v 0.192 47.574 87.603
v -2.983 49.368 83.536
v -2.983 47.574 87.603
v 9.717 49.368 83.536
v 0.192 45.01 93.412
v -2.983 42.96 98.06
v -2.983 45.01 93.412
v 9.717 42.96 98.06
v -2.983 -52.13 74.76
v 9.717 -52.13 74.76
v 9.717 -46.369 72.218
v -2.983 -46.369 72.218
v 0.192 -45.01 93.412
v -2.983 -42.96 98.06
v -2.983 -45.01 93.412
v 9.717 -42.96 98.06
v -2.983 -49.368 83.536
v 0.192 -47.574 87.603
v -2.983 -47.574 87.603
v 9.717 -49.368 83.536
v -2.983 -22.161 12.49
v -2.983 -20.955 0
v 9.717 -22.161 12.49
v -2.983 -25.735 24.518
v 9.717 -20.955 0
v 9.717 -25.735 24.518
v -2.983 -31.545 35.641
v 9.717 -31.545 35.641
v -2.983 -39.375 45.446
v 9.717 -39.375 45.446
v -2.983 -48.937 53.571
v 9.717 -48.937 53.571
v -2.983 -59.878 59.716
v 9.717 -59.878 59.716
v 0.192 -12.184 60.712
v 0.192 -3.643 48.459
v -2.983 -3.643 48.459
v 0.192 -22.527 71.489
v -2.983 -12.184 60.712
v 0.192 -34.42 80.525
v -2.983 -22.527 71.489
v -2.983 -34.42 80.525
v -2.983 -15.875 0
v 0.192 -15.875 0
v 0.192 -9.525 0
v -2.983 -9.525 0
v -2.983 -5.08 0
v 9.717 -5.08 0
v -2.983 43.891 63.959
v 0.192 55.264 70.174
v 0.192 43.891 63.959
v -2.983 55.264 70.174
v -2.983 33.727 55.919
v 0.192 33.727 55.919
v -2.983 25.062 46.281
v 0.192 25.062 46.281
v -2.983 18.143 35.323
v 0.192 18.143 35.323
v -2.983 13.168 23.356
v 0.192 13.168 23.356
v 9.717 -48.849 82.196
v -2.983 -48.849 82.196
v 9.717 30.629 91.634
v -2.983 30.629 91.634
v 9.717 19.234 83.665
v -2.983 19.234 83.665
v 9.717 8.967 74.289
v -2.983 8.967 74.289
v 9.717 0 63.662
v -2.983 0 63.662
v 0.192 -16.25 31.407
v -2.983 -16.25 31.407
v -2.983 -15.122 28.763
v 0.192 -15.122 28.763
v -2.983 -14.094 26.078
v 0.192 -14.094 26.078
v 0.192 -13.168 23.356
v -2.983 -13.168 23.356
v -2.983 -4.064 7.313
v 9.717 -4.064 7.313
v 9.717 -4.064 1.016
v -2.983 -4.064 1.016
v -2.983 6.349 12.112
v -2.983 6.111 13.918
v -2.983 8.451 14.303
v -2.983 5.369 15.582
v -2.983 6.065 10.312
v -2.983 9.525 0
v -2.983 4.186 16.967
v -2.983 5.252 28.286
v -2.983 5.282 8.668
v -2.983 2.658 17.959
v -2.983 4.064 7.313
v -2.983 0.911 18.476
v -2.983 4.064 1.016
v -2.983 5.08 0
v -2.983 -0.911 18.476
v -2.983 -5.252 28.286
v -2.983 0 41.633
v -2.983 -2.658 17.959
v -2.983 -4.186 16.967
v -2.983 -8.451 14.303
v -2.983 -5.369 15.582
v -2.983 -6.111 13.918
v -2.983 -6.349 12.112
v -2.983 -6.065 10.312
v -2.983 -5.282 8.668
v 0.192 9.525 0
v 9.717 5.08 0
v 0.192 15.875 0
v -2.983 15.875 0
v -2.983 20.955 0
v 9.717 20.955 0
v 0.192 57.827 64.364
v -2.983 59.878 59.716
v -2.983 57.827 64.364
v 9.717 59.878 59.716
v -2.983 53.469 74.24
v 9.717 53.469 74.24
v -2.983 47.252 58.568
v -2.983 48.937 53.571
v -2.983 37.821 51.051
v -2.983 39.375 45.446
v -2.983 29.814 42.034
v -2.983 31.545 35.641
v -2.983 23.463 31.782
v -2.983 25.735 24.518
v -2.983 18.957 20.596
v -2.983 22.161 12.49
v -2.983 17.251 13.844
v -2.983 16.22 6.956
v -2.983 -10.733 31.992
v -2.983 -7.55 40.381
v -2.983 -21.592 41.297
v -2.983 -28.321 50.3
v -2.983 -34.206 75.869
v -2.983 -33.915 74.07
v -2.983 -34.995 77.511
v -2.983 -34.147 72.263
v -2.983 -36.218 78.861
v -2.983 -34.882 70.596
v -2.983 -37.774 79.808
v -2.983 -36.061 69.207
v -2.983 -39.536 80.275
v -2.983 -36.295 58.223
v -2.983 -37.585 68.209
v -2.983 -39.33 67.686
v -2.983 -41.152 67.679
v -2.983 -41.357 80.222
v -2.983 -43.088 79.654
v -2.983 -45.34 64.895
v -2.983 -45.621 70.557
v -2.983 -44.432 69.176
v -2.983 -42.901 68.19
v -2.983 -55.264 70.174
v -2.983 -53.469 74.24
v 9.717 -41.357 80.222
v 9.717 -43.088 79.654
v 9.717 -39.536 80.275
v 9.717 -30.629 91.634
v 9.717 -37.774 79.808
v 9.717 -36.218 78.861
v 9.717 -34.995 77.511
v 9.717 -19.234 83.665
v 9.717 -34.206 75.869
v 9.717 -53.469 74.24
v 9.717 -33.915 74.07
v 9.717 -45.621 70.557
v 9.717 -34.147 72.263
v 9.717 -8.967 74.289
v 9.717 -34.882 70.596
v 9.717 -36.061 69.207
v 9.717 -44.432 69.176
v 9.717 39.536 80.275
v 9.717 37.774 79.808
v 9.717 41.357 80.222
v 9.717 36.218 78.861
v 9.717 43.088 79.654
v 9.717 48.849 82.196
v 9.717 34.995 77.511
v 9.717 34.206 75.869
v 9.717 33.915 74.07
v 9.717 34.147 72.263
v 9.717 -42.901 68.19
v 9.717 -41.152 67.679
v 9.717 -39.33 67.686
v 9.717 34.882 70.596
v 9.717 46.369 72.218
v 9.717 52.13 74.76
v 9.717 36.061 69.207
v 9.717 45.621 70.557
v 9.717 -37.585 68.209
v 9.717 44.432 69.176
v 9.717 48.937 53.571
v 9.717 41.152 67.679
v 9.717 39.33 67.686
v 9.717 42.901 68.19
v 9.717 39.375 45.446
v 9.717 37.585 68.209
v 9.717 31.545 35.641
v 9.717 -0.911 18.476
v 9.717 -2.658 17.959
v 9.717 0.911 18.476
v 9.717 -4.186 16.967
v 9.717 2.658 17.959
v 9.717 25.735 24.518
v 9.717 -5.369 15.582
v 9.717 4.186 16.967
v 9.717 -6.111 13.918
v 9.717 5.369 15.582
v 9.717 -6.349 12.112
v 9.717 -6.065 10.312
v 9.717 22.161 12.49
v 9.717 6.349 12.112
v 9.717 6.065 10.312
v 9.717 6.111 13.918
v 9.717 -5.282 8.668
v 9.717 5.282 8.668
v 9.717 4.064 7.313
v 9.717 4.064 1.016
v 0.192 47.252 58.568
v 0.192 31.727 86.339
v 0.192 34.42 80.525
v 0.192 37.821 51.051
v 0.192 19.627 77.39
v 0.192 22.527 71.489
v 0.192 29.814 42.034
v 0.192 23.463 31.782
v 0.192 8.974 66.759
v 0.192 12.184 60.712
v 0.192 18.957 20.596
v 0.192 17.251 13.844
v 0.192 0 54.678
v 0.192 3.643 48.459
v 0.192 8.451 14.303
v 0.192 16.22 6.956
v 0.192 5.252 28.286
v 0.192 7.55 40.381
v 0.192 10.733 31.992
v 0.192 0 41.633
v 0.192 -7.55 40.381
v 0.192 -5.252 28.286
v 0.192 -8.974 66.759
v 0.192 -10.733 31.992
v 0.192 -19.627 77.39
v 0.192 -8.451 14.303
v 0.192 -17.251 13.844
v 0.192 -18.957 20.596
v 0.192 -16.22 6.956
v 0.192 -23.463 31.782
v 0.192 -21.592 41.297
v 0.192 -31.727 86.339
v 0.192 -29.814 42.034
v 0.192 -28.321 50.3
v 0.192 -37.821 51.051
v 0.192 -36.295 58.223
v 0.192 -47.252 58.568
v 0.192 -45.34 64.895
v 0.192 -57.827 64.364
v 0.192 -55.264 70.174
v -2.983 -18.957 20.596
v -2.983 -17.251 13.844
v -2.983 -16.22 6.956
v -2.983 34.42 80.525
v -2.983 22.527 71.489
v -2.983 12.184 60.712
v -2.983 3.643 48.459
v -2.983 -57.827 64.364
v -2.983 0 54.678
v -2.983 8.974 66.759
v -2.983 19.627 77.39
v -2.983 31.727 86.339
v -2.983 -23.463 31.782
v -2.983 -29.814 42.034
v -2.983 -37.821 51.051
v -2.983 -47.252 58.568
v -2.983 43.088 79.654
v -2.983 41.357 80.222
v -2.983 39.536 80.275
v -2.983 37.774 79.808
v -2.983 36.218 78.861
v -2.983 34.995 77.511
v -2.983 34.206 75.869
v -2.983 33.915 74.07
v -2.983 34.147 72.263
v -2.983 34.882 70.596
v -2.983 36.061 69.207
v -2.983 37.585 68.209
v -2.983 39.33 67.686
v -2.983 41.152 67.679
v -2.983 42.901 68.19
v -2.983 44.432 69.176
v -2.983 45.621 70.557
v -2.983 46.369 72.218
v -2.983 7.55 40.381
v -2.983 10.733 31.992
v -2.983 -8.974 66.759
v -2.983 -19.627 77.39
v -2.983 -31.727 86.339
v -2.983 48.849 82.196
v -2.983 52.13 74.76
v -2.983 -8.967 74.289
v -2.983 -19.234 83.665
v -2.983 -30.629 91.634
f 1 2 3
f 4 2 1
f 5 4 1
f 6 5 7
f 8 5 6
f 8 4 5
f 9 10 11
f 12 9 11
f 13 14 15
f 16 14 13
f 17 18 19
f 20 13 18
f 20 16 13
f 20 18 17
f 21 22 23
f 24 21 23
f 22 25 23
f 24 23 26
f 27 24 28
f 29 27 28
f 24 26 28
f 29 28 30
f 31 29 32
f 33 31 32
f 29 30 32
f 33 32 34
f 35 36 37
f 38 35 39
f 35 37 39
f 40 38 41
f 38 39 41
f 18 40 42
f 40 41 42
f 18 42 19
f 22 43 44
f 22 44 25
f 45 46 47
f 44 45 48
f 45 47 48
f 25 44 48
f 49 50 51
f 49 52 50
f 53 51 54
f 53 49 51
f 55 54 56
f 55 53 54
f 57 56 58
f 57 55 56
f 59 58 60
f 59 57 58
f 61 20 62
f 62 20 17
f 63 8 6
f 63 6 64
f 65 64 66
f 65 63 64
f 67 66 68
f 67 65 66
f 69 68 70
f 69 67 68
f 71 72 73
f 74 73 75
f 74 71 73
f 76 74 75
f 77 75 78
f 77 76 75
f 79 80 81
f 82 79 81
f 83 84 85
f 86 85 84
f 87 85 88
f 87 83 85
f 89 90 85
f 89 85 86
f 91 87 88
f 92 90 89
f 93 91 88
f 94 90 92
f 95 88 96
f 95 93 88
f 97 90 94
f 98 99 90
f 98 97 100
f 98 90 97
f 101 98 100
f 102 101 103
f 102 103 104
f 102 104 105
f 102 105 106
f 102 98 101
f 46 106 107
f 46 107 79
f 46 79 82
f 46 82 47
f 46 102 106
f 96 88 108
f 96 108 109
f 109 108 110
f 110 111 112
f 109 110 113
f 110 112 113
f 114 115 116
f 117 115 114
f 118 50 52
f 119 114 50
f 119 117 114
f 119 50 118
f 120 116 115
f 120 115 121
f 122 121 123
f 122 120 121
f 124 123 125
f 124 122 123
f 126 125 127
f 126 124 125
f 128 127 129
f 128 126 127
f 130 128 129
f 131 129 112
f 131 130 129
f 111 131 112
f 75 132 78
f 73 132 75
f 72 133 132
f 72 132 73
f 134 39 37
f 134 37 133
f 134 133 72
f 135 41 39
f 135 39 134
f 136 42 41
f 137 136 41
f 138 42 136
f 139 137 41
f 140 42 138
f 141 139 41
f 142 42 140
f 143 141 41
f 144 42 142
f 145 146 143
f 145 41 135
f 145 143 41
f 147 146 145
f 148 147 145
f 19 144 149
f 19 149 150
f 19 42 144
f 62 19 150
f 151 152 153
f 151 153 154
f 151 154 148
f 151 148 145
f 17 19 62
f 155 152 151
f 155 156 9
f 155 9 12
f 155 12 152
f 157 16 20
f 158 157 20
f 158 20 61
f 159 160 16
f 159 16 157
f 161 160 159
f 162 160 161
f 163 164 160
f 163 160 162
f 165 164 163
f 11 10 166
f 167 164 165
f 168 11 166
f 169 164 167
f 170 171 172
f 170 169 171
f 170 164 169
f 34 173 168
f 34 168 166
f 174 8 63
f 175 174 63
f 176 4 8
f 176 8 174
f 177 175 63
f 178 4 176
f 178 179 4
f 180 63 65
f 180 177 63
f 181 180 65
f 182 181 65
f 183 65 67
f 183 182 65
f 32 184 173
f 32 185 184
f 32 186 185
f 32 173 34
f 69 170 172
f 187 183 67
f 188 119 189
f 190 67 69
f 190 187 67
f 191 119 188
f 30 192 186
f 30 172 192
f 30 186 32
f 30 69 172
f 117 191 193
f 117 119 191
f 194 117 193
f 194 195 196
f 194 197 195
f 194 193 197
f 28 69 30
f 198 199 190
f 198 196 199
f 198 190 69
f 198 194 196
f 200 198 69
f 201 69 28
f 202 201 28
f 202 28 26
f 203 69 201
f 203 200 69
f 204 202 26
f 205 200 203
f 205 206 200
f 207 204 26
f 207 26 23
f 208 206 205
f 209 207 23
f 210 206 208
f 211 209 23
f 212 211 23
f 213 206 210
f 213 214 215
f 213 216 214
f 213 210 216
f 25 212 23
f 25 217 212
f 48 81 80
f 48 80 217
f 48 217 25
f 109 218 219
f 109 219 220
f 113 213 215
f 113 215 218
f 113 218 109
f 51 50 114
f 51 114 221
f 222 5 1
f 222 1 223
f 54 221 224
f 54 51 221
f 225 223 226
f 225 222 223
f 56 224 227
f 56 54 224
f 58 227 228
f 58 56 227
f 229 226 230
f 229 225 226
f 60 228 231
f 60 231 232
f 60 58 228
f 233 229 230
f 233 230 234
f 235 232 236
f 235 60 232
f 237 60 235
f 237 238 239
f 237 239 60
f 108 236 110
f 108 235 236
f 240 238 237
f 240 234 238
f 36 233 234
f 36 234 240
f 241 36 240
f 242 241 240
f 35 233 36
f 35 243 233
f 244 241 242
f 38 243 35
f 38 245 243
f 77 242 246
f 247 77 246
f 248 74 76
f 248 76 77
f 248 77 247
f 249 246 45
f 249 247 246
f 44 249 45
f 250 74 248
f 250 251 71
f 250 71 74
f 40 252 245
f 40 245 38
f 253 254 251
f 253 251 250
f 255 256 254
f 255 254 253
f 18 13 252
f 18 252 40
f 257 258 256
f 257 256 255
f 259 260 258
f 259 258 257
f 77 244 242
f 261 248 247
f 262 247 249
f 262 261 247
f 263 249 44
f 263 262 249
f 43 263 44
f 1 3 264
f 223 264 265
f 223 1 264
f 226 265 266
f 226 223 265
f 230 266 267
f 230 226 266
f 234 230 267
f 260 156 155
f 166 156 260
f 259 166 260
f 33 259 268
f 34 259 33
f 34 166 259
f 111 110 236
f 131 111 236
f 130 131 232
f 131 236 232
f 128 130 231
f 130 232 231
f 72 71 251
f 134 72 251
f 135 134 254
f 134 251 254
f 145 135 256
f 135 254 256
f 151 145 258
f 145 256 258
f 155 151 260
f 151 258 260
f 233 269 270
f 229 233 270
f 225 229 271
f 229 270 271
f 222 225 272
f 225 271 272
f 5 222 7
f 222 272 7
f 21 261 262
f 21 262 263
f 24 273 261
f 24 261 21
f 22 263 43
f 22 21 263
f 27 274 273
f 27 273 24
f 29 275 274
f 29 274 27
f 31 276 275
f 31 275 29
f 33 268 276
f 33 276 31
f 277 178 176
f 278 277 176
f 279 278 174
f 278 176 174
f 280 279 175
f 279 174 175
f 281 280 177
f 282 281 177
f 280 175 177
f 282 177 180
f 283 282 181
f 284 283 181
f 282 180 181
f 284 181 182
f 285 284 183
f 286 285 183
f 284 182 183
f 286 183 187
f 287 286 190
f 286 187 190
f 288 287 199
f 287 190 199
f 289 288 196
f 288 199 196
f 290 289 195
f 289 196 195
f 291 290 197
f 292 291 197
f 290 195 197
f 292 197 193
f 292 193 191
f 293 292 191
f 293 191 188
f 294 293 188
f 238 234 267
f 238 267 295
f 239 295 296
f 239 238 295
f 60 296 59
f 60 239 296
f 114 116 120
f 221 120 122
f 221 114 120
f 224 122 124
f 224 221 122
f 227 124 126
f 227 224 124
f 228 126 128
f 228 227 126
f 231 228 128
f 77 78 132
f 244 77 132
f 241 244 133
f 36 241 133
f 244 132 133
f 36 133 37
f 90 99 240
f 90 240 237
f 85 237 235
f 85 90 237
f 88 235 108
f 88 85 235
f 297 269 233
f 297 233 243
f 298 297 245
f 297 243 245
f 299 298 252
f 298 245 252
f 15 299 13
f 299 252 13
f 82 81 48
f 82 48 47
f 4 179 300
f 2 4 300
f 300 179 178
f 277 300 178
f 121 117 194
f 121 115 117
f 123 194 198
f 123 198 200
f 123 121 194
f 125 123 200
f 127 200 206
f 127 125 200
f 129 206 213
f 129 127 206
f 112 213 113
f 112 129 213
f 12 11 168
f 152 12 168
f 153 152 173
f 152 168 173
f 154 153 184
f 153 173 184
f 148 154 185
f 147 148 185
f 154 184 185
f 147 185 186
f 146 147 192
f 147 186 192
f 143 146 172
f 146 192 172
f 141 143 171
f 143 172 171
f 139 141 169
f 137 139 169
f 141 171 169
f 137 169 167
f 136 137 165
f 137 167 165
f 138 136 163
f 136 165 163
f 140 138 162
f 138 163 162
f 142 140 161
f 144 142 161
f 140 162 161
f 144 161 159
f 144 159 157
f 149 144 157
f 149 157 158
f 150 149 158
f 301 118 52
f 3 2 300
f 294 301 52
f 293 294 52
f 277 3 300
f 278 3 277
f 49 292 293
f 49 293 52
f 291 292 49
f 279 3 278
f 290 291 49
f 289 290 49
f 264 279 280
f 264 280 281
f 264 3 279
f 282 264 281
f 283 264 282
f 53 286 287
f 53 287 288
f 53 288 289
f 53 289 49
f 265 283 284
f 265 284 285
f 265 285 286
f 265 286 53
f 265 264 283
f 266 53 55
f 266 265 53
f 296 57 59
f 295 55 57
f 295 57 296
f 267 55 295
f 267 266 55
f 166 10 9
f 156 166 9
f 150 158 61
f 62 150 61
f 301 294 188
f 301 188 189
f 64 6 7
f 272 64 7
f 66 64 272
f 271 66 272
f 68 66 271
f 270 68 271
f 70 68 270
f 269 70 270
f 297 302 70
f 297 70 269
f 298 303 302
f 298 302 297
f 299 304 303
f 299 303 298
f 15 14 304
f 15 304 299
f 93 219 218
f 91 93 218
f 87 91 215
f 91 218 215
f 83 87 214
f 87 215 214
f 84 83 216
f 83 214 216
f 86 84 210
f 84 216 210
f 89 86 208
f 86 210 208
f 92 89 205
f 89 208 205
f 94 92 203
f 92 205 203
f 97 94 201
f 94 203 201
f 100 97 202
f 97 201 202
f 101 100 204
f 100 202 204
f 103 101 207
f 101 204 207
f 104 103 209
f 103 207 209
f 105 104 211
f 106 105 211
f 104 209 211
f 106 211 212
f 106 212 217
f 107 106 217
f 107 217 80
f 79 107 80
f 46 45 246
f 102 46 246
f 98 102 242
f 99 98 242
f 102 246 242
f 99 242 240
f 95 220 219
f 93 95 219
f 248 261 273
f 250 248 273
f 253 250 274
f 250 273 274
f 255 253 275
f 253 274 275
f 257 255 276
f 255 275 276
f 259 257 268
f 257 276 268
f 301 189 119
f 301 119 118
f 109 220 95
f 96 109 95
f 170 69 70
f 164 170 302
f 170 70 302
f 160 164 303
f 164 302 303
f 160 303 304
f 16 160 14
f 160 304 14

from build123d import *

# Parameters (mm, degrees)
F4_DEPTH  = 12.7
F5_SIZE   = 1.016
F8_W      = 3.175
F8_H      = 6.35
F12_DEPTH = 12.7
F13_SIZE  = 1.016


with BuildPart() as f2:
    # F2: sweep along a path in F1
    with BuildLine(Plane.YZ) as f2_path:
        ThreePointArc((0, 0), (-13.9895526568, 47.0829736144), (-51.4187773904, 78.8881166537))
    # F0 (on Top) → F2 (sweep)
    with BuildSketch(Plane.XY):
        Polygon((-2.9826171882, -15.875), (-2.9826171882, -20.955), (9.7173828118, -20.955), (9.7173828118, 20.955), (-2.9826171882, 20.955), (-2.9826171882, 15.875), (0.1923828118, 15.875), (0.1923828118, 9.525), (-2.9826171882, 9.525), (-2.9826171882, -9.525), (0.1923828118, -9.525), (0.1923828118, -15.875), align=None)
    sweep(path=f2_path.line)

    # F3 (on face) → F4 (cut, through all)
    with BuildSketch(Plane.YZ.offset(9.7173828118)):
        with BuildLine():
            Line((-4.064, 7.3128193311), (-4.064, 0))
            Line((-4.064, 0), (4.064, 0))
            Line((4.064, 0), (4.064, 7.3128193311))
            ThreePointArc((4.064, 7.3128193311), (0, 18.542), (-4.064, 7.3128193311))
        make_face()
        with BuildLine():
            Line((-43.0877289811, 79.6543117793), (-49.7782573242, 82.6062868909))
            Line((-49.7782573242, 82.6062868909), (-53.0592974567, 75.1699464166))
            Line((-53.0592974567, 75.1699464166), (-46.3687691136, 72.217971305))
            ThreePointArc((-46.3687691136, 72.217971305), (-34.4546256835, 71.4032438515), (-43.0877289811, 79.6543117793))
        make_face()
    extrude(amount=-F4_DEPTH, mode=Mode.SUBTRACT)

    # F5
    f5_edges = [f2.edges().sort_by_distance(p)[0] for p in [
        (3.367383, -53.059297, 75.169946),
        (3.367383, -49.778257, 82.606287),
        (3.367383, 4.064, 0),
        (3.367383, -4.064, 0),
    ]]
    chamfer(f5_edges, length=F5_SIZE)

    # F7: sweep along a path in F6
    with BuildLine(Plane.YZ) as f7_path:
        ThreePointArc((51.4187773904, 78.8881166537), (13.9895526568, 47.0829736144), (0, 0))
    # F0 (on Top) → F7 (sweep)
    with BuildSketch(Plane.XY):
        Polygon((-2.9826171882, -15.875), (-2.9826171882, -20.955), (9.7173828118, -20.955), (9.7173828118, 20.955), (-2.9826171882, 20.955), (-2.9826171882, 15.875), (0.1923828118, 15.875), (0.1923828118, 9.525), (-2.9826171882, 9.525), (-2.9826171882, -9.525), (0.1923828118, -9.525), (0.1923828118, -15.875), align=None)
    sweep(path=f7_path.line)

    # F9: sweep along a path in F9_path
    with BuildLine(Plane(origin=(-2.9826171882, 20.955, 0), x_dir=(0, 0, 1), z_dir=(1, 0, 0))) as f9_path:
        ThreePointArc((0, 0), (35.6406156079, -10.5897361719), (59.7163013685, -38.922708982))
    # F8 (on face) → F9 (sweep, cut)
    with BuildSketch(Plane(origin=(0, 0, 0), x_dir=(1, 0, 0), z_dir=(0, 0, -1))):
        with Locations((-1.3951171882, -12.7)):
            Rectangle(F8_W, F8_H)
        with Locations((-1.3951171882, 12.7)):
            Rectangle(F8_W, F8_H)
    sweep(path=f9_path.line, mode=Mode.SUBTRACT)

    # F10: sweep along a path in F10_path
    with BuildLine(Plane(origin=(-2.9826171882, -59.877708982, 59.7163013685), x_dir=(0, 0, 1), z_dir=(1, 0, 0))) as f10_path:
        ThreePointArc((0, 0), (-24.0756857607, -28.33297281), (-59.7163013685, -38.922708982))
    # F8 (on face) → F10 (sweep, cut)
    with BuildSketch(Plane(origin=(0, 0, 0), x_dir=(1, 0, 0), z_dir=(0, 0, -1))):
        with Locations((-1.3951171882, -12.7)):
            Rectangle(F8_W, F8_H)
        with Locations((-1.3951171882, 12.7)):
            Rectangle(F8_W, F8_H)
    sweep(path=f10_path.line, mode=Mode.SUBTRACT)

    # F11 (on face) → F12 (cut, through all)
    with BuildSketch(Plane.YZ.offset(9.7173828118)):
        with BuildLine():
            Line((-4.064, 0), (4.064, 0))
            Line((4.064, 0), (4.064, 7.3128193311))
            ThreePointArc((4.064, 7.3128193311), (0, 18.542), (-4.064, 7.3128193311))
            Line((-4.064, 7.3128193311), (-4.064, 0))
        make_face()
        with BuildLine():
            Line((46.3687691136, 72.217971305), (53.0592974567, 75.1699464166))
            Line((53.0592974567, 75.1699464166), (49.7782573242, 82.6062868909))
            Line((49.7782573242, 82.6062868909), (43.0877289811, 79.6543117793))
            ThreePointArc((43.0877289811, 79.6543117793), (34.4546256835, 71.4032438515), (46.3687691136, 72.217971305))
        make_face()
    extrude(amount=-F12_DEPTH, mode=Mode.SUBTRACT)

    # F13
    f13_edges = [f2.edges().sort_by_distance(p)[0] for p in [
        (3.367383, 4.064, 0),
        (3.367383, -4.064, 0),
        (3.367383, 53.059297, 75.169946),
        (3.367383, 49.778257, 82.606287),
    ]]
    chamfer(f13_edges, length=F13_SIZE)


solid = f2.part
